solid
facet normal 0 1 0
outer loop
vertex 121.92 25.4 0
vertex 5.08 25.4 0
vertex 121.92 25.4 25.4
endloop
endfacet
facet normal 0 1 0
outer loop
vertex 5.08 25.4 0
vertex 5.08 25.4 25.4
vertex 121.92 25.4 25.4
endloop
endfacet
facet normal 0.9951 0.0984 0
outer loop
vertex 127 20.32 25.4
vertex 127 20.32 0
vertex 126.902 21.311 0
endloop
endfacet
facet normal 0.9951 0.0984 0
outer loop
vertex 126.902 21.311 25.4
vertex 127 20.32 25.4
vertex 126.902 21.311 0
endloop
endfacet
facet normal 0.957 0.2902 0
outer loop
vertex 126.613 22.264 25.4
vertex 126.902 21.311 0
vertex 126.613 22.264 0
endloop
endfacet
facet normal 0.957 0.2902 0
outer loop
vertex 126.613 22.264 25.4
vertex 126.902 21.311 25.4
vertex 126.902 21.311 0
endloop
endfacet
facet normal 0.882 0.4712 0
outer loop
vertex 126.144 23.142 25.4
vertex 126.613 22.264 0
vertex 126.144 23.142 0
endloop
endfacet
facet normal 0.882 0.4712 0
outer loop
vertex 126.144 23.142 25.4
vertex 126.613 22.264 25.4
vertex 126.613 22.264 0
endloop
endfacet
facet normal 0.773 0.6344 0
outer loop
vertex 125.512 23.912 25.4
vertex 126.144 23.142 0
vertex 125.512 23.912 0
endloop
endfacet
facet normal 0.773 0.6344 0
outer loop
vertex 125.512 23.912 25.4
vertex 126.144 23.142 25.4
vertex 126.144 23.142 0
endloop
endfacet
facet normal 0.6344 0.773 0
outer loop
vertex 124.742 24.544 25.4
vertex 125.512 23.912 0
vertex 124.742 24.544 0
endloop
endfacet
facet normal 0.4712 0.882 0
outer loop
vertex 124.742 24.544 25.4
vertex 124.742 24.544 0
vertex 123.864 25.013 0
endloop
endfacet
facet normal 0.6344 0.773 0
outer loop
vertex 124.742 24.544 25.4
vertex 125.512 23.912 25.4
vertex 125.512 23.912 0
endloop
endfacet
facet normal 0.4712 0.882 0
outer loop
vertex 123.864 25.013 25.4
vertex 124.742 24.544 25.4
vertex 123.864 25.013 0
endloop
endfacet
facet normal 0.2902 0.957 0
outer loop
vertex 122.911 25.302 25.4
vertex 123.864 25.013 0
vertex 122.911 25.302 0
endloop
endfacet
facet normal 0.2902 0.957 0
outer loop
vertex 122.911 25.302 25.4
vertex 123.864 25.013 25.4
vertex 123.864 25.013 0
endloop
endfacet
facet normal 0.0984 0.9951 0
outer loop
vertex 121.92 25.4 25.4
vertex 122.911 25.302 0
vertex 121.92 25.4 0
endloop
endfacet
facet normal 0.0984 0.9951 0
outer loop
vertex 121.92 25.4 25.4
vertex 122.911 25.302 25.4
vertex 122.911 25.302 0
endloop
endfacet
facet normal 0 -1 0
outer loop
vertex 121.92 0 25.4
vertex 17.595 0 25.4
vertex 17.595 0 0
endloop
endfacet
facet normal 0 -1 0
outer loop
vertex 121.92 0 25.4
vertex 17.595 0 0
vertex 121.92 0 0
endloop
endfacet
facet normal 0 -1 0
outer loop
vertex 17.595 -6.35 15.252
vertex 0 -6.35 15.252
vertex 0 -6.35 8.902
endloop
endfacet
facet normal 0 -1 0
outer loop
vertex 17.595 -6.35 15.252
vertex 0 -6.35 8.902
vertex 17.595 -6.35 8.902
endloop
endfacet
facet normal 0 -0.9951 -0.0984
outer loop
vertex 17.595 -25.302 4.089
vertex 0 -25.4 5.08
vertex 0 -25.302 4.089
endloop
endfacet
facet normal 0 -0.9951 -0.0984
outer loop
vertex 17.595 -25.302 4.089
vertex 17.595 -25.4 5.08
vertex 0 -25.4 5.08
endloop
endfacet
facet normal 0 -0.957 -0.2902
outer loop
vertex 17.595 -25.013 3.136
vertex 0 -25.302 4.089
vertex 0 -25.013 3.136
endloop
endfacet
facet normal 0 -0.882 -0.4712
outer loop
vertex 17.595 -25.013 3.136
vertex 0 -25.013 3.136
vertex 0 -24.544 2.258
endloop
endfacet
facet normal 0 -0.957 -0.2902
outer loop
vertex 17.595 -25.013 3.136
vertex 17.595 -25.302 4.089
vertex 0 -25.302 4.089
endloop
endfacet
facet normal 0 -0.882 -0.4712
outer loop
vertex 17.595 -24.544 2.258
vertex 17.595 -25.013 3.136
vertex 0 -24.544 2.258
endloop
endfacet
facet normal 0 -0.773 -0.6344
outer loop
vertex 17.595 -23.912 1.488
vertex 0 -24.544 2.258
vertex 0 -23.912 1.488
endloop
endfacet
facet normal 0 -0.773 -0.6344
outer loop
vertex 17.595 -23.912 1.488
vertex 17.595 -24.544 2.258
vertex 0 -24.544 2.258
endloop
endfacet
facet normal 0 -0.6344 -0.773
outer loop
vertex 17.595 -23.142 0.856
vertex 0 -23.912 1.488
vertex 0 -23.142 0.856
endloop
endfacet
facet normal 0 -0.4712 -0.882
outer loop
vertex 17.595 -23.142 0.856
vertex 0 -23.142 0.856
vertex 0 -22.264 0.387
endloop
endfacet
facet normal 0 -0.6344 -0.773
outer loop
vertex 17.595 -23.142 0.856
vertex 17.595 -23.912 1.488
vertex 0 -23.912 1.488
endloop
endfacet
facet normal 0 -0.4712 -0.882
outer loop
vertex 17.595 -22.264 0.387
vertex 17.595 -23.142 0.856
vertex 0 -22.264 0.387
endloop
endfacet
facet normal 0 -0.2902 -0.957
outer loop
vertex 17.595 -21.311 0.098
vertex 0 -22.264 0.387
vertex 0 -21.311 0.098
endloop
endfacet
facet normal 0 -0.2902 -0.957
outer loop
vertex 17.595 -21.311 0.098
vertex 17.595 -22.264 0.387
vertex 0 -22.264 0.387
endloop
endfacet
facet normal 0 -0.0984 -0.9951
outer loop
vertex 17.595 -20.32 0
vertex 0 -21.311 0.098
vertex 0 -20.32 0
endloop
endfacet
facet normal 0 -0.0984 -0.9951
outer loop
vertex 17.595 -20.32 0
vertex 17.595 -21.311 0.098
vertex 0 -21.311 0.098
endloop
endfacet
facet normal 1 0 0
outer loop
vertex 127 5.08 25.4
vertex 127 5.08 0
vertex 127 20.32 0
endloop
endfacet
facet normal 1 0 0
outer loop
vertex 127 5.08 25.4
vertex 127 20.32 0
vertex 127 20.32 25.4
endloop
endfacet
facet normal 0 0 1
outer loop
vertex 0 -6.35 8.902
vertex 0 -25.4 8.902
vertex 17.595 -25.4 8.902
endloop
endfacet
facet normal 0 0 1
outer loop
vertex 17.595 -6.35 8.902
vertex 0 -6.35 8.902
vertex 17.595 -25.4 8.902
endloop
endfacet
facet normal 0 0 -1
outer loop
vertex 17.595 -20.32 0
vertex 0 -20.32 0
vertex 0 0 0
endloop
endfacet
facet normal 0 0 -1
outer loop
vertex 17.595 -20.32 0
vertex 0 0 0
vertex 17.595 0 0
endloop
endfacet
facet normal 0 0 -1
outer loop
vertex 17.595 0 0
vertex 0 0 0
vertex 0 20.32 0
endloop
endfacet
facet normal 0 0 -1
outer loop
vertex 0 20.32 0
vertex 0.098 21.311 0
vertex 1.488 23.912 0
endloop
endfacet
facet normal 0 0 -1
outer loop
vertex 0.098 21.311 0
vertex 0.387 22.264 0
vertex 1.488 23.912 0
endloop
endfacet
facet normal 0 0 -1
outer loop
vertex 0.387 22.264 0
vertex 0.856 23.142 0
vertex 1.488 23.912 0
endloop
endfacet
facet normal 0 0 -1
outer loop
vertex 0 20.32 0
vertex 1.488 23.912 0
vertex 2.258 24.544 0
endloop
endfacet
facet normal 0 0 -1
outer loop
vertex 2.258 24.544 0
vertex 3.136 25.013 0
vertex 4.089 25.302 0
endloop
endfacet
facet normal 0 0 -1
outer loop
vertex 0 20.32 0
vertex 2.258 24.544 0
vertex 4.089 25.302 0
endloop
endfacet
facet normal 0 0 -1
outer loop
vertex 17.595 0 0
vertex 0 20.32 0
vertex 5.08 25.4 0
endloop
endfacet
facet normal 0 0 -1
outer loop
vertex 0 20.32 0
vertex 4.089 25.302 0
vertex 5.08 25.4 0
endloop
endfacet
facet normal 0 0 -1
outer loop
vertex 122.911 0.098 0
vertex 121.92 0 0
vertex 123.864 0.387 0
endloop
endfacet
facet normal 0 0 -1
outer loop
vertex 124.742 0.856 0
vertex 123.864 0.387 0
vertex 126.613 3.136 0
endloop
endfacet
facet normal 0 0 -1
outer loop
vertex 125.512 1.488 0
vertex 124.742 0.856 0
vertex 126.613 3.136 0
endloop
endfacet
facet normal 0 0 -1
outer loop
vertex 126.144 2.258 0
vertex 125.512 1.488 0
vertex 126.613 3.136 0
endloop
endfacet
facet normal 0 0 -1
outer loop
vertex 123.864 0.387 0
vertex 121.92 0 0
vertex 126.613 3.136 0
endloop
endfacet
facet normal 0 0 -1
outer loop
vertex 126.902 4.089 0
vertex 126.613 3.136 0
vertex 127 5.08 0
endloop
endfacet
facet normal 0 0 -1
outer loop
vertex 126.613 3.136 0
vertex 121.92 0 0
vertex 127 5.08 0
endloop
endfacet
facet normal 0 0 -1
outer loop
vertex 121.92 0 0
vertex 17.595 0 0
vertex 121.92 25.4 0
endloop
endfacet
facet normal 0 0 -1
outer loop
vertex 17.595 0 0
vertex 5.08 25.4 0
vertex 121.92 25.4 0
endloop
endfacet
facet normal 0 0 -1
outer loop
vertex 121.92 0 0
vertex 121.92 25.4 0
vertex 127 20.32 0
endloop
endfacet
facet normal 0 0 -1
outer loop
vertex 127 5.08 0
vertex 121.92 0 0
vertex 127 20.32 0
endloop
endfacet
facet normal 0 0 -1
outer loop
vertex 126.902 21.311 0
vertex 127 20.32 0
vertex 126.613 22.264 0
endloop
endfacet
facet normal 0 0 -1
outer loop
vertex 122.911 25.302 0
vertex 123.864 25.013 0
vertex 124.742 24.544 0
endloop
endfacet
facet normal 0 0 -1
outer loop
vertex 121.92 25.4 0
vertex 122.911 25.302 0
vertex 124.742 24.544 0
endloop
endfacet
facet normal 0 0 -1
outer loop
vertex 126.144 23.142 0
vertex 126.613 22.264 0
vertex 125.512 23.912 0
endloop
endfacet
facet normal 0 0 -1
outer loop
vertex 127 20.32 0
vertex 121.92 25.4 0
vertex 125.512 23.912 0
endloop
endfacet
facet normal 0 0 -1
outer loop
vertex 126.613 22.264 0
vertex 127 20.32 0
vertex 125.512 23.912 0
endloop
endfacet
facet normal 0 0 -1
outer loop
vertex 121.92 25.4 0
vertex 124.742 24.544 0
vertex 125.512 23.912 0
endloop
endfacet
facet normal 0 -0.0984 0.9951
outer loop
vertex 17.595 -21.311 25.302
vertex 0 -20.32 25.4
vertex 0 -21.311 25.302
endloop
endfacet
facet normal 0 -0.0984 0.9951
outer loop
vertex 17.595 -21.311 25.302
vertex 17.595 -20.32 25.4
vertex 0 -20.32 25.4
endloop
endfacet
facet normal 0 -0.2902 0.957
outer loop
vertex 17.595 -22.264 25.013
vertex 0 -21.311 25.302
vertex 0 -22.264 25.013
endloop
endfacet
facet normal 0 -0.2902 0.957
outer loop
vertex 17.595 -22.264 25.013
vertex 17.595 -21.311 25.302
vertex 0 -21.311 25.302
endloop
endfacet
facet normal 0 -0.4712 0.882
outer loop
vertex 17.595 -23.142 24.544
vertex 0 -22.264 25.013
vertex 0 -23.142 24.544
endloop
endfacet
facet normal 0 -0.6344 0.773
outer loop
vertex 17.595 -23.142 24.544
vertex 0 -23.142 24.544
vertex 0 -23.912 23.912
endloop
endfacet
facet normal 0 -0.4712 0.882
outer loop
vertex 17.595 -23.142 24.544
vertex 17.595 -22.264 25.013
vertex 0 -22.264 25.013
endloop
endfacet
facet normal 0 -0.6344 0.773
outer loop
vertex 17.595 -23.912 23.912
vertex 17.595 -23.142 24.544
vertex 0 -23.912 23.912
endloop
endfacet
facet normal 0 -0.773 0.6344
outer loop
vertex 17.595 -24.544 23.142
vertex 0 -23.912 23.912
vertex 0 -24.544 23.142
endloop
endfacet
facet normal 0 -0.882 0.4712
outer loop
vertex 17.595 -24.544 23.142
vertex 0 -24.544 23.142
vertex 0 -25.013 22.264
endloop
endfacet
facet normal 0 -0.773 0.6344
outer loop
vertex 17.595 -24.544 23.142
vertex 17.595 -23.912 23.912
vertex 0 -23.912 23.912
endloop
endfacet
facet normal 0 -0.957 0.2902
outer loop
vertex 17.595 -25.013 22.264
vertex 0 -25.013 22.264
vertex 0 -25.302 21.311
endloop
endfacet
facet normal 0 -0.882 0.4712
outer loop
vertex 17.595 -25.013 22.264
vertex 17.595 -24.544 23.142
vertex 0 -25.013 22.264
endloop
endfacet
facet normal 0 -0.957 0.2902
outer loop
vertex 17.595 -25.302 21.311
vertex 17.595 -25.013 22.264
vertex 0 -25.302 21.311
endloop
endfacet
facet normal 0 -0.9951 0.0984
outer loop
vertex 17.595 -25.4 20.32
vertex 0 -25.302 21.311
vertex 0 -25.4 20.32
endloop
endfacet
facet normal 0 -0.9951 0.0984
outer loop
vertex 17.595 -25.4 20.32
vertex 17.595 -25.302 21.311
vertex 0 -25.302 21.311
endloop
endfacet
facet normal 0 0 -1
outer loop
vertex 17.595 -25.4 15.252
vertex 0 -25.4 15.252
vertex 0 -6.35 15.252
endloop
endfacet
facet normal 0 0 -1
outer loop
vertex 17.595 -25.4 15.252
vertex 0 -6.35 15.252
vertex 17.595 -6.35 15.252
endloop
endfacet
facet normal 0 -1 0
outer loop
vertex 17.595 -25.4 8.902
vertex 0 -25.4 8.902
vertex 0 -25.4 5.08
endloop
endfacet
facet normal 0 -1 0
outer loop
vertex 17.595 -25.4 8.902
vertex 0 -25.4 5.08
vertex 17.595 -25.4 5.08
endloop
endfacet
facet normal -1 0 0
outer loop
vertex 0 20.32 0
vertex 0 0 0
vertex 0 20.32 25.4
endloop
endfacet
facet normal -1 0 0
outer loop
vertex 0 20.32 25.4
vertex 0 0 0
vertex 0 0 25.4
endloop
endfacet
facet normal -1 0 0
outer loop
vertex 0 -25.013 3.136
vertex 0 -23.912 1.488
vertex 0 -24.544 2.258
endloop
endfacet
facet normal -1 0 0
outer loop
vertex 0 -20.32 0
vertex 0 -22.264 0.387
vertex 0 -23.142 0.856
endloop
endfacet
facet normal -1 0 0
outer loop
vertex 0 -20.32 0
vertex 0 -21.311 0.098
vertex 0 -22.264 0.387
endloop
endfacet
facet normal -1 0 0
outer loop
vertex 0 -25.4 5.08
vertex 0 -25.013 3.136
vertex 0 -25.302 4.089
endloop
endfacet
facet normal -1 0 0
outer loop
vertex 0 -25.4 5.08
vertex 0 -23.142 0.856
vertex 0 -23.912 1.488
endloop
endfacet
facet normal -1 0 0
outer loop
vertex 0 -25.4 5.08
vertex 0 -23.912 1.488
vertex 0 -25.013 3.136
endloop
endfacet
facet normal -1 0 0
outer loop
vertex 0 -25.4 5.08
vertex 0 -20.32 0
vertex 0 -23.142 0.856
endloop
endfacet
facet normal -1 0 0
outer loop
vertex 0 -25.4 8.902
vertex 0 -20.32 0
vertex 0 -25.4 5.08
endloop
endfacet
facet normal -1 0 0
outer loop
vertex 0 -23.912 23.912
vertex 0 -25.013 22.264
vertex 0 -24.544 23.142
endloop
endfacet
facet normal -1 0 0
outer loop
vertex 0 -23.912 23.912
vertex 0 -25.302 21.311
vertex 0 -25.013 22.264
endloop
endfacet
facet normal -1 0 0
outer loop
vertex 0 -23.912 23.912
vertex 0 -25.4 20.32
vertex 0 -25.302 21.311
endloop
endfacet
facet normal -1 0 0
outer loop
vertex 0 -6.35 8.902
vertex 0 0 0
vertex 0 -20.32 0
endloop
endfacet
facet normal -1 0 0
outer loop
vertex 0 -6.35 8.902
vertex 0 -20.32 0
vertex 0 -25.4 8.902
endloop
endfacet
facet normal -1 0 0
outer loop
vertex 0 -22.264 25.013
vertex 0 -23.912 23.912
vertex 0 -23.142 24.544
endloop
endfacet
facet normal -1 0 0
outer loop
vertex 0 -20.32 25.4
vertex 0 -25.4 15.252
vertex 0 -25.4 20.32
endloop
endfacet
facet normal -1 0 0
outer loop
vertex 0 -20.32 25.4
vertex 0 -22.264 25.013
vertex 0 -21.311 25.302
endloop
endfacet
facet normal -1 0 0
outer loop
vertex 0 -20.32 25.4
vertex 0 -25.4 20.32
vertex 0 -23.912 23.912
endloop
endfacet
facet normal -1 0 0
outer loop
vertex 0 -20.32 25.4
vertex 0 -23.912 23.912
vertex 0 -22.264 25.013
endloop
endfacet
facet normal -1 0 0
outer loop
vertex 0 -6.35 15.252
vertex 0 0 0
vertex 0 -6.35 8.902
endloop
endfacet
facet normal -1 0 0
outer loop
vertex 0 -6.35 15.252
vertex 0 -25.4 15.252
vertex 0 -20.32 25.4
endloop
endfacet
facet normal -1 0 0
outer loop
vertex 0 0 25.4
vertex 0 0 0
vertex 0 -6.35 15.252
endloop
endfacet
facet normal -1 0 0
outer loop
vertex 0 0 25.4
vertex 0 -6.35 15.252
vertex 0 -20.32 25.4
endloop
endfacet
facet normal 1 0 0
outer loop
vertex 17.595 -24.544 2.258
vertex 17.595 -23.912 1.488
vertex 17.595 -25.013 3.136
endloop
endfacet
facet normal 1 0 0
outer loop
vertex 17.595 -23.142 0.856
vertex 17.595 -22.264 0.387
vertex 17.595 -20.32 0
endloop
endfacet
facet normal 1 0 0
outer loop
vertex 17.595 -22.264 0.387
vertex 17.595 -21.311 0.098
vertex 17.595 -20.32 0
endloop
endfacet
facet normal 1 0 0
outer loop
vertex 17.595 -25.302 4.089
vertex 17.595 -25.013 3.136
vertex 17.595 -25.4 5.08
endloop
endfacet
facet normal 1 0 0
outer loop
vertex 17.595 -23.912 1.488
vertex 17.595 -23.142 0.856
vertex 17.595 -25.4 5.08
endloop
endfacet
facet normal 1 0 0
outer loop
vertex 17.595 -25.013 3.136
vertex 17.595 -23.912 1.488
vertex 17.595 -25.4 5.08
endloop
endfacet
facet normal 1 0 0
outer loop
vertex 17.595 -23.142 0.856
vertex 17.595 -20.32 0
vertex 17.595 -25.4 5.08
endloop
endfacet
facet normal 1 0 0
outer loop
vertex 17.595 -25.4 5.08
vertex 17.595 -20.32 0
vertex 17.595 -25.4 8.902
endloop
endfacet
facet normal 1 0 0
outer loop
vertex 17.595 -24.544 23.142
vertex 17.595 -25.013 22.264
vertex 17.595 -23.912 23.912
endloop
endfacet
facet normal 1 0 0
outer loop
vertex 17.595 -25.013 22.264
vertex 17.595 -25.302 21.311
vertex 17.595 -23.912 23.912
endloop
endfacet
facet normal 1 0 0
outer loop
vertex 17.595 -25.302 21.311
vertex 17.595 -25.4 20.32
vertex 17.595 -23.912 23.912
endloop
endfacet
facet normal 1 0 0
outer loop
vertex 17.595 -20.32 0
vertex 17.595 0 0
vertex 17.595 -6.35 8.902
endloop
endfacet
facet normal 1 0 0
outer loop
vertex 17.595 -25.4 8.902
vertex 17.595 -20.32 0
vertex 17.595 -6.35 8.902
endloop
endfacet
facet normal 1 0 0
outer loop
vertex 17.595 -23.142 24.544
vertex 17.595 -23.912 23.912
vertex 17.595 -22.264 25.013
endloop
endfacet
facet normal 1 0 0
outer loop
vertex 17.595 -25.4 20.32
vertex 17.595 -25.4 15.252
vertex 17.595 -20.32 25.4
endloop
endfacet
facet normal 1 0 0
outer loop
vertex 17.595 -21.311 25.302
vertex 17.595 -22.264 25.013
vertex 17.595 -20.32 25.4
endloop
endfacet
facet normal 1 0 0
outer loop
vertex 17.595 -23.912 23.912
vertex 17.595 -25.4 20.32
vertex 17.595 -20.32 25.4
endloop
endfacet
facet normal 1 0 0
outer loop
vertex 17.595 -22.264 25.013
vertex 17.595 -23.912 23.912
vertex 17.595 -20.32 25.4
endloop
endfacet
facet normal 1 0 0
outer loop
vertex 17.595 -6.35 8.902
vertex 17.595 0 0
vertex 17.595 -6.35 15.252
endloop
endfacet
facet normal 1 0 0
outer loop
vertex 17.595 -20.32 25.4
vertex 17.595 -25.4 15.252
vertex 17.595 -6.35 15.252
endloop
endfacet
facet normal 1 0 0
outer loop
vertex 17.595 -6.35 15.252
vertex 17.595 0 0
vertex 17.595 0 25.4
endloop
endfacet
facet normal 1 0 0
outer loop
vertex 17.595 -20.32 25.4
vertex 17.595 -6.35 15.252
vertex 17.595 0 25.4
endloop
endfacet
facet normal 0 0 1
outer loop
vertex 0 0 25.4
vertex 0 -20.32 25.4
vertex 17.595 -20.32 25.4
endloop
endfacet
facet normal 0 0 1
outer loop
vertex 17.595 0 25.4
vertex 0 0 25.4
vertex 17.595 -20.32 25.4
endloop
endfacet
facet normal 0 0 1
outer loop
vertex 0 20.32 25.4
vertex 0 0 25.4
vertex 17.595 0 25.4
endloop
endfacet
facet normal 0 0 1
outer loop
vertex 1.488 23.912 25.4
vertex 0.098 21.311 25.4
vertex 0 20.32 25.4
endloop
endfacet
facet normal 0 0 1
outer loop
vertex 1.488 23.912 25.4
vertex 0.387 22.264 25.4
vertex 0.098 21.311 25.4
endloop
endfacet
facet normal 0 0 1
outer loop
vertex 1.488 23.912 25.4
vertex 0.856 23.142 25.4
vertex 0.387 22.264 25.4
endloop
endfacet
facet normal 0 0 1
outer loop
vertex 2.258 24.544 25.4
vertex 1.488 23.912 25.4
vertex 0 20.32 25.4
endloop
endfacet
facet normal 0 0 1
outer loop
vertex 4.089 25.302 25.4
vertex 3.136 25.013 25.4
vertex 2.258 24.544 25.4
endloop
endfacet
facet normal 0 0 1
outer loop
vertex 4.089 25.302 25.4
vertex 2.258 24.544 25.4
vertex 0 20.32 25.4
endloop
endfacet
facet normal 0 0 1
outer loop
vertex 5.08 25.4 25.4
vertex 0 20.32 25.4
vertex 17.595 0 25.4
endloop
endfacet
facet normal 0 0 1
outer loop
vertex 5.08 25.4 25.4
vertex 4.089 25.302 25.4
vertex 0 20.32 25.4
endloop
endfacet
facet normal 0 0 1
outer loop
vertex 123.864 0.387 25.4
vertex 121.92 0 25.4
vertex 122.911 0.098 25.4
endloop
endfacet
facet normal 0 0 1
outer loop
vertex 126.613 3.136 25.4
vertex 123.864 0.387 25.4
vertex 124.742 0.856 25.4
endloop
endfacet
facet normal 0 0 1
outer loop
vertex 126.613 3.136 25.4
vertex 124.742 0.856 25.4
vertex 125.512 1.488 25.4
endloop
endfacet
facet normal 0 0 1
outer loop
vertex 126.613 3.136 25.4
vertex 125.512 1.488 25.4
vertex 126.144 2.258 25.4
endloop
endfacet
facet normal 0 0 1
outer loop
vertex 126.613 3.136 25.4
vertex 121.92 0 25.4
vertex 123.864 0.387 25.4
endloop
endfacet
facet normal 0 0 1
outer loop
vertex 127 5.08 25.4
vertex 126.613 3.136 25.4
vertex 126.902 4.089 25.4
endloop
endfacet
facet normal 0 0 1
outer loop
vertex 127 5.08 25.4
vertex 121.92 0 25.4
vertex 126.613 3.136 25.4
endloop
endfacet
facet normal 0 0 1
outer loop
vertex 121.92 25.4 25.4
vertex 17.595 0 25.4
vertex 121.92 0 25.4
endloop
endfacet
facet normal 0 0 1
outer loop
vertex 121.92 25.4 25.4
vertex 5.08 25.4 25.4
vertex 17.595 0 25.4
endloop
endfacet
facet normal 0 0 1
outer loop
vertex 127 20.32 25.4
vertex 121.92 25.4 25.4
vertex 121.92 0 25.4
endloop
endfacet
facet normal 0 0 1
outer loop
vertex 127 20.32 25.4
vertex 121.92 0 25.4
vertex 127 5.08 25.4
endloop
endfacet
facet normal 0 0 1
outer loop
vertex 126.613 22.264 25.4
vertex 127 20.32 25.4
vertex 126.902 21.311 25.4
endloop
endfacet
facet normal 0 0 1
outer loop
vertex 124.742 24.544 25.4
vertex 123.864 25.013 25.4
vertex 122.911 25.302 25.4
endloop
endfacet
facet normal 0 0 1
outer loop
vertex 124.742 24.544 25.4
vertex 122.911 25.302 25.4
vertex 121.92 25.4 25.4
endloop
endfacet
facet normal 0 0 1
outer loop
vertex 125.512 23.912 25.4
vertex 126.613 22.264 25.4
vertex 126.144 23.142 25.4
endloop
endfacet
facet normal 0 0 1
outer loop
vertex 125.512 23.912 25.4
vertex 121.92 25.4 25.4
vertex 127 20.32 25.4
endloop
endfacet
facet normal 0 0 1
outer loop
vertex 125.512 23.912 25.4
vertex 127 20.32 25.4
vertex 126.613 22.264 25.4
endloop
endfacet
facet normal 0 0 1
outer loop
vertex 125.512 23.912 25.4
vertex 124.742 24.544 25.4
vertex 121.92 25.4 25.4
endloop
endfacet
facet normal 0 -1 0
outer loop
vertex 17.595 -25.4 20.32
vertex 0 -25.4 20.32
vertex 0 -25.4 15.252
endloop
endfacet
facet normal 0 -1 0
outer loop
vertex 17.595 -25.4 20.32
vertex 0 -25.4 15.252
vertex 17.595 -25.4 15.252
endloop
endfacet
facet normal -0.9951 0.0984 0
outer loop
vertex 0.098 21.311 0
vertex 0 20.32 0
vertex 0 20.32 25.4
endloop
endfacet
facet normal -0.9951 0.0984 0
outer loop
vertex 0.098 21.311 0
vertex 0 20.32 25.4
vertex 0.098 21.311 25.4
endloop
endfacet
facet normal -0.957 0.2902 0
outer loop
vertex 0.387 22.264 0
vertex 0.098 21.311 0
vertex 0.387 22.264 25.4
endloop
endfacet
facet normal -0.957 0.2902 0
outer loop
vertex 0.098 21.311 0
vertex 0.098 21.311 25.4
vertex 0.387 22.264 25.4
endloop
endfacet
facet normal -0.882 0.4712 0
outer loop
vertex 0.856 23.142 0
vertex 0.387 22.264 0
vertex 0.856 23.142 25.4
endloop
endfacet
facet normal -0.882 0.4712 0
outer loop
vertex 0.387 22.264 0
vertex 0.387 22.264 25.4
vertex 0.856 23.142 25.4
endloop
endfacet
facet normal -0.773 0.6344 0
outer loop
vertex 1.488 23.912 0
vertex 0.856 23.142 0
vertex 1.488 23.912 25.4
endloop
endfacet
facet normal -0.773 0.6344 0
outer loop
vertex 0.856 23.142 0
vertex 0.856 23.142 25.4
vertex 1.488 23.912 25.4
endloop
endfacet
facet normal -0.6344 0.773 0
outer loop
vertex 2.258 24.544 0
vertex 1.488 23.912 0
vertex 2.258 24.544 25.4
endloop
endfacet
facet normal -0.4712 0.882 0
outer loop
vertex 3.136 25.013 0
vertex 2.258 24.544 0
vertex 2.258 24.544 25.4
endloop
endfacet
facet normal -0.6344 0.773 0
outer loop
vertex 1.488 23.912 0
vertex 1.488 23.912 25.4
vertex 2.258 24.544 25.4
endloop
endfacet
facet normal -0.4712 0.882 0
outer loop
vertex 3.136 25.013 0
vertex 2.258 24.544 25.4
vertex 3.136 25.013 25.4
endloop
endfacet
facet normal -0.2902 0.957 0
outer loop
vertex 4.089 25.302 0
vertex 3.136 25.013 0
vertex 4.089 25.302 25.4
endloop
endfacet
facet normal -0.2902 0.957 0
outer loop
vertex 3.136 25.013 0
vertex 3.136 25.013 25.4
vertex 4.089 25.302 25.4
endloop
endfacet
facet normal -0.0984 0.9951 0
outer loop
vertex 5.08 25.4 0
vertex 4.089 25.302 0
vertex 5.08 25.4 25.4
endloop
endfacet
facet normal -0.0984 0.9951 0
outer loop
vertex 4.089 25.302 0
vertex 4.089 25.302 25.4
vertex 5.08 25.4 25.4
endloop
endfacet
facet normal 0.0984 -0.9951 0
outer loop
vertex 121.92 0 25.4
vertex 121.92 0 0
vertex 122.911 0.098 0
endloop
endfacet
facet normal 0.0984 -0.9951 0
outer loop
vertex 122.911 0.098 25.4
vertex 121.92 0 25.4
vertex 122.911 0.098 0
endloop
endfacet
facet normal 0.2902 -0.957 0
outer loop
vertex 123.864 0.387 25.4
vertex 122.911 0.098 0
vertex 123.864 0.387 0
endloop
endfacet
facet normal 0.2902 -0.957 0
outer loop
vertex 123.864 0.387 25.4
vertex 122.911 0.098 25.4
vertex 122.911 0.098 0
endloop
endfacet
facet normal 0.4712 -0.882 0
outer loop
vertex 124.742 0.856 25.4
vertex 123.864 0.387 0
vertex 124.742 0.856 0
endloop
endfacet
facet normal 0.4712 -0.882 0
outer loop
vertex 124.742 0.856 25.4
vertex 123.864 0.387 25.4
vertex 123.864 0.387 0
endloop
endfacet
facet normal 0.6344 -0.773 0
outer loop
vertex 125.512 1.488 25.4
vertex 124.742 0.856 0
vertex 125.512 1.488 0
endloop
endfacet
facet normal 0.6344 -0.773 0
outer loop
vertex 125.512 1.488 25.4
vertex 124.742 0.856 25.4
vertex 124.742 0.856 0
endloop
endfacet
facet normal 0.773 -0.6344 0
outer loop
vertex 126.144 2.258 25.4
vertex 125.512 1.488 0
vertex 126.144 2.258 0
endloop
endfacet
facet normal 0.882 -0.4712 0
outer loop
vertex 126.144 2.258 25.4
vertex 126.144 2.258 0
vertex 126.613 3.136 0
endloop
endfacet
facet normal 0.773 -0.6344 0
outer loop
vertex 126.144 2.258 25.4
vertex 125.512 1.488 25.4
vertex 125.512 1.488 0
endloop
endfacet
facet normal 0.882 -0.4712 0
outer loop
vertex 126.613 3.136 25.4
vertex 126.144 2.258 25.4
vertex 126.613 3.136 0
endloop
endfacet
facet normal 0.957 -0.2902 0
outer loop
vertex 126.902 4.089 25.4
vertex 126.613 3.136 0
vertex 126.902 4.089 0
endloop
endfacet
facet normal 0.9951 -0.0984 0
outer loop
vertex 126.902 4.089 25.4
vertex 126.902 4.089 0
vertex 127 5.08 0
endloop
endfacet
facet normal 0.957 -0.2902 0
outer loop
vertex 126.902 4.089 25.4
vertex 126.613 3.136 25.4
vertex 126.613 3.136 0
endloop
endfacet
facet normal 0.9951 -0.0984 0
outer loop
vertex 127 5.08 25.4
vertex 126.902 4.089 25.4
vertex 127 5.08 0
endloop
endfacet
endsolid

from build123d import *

# Parameters (mm, degrees)
F0_W     = 127
F0_H     = 25.4
F1_DEPTH = 25.4
F2_W     = 17.595317
F2_H     = 25.4
F3_DEPTH = 25.4
F4_W     = 17.595317
F4_H     = 6.35
F5_DEPTH = 19.05
F6_R     = 5.08
F7_R     = 5.08


with BuildPart() as f1:
    # F0 (on Front) → F1 (new body)
    with BuildSketch(Plane.XZ):
        with Locations((63.5, 12.7)):
            Rectangle(F0_W, F0_H)
    extrude(amount=-F1_DEPTH)

    # F2 (on face) → F3 (join)
    with BuildSketch(Plane.XZ):
        with Locations((8.797658, 12.7)):
            Rectangle(F2_W, F2_H)
    extrude(amount=F3_DEPTH)

    # F4 (on face) → F5 (cut)
    with BuildSketch(Plane.XZ.offset(25.4)):
        with Locations((8.797658, 12.076512)):
            Rectangle(F4_W, F4_H)
    extrude(amount=-F5_DEPTH, mode=Mode.SUBTRACT)

    # F6
    f6_edges = [f1.edges().sort_by_distance(p)[0] for p in [
        (8.797659, -25.4, 25.4),
        (8.797659, -25.4, 0),
        (127, 0, 12.7),
        (127, 25.4, 12.7),
    ]]
    fillet(f6_edges, radius=F6_R)

    # F7
    f7_edges = [f1.edges().sort_by_distance(p)[0] for p in [
        (0, 25.4, 12.7),
    ]]
    fillet(f7_edges, radius=F7_R)


solid = f1.part
